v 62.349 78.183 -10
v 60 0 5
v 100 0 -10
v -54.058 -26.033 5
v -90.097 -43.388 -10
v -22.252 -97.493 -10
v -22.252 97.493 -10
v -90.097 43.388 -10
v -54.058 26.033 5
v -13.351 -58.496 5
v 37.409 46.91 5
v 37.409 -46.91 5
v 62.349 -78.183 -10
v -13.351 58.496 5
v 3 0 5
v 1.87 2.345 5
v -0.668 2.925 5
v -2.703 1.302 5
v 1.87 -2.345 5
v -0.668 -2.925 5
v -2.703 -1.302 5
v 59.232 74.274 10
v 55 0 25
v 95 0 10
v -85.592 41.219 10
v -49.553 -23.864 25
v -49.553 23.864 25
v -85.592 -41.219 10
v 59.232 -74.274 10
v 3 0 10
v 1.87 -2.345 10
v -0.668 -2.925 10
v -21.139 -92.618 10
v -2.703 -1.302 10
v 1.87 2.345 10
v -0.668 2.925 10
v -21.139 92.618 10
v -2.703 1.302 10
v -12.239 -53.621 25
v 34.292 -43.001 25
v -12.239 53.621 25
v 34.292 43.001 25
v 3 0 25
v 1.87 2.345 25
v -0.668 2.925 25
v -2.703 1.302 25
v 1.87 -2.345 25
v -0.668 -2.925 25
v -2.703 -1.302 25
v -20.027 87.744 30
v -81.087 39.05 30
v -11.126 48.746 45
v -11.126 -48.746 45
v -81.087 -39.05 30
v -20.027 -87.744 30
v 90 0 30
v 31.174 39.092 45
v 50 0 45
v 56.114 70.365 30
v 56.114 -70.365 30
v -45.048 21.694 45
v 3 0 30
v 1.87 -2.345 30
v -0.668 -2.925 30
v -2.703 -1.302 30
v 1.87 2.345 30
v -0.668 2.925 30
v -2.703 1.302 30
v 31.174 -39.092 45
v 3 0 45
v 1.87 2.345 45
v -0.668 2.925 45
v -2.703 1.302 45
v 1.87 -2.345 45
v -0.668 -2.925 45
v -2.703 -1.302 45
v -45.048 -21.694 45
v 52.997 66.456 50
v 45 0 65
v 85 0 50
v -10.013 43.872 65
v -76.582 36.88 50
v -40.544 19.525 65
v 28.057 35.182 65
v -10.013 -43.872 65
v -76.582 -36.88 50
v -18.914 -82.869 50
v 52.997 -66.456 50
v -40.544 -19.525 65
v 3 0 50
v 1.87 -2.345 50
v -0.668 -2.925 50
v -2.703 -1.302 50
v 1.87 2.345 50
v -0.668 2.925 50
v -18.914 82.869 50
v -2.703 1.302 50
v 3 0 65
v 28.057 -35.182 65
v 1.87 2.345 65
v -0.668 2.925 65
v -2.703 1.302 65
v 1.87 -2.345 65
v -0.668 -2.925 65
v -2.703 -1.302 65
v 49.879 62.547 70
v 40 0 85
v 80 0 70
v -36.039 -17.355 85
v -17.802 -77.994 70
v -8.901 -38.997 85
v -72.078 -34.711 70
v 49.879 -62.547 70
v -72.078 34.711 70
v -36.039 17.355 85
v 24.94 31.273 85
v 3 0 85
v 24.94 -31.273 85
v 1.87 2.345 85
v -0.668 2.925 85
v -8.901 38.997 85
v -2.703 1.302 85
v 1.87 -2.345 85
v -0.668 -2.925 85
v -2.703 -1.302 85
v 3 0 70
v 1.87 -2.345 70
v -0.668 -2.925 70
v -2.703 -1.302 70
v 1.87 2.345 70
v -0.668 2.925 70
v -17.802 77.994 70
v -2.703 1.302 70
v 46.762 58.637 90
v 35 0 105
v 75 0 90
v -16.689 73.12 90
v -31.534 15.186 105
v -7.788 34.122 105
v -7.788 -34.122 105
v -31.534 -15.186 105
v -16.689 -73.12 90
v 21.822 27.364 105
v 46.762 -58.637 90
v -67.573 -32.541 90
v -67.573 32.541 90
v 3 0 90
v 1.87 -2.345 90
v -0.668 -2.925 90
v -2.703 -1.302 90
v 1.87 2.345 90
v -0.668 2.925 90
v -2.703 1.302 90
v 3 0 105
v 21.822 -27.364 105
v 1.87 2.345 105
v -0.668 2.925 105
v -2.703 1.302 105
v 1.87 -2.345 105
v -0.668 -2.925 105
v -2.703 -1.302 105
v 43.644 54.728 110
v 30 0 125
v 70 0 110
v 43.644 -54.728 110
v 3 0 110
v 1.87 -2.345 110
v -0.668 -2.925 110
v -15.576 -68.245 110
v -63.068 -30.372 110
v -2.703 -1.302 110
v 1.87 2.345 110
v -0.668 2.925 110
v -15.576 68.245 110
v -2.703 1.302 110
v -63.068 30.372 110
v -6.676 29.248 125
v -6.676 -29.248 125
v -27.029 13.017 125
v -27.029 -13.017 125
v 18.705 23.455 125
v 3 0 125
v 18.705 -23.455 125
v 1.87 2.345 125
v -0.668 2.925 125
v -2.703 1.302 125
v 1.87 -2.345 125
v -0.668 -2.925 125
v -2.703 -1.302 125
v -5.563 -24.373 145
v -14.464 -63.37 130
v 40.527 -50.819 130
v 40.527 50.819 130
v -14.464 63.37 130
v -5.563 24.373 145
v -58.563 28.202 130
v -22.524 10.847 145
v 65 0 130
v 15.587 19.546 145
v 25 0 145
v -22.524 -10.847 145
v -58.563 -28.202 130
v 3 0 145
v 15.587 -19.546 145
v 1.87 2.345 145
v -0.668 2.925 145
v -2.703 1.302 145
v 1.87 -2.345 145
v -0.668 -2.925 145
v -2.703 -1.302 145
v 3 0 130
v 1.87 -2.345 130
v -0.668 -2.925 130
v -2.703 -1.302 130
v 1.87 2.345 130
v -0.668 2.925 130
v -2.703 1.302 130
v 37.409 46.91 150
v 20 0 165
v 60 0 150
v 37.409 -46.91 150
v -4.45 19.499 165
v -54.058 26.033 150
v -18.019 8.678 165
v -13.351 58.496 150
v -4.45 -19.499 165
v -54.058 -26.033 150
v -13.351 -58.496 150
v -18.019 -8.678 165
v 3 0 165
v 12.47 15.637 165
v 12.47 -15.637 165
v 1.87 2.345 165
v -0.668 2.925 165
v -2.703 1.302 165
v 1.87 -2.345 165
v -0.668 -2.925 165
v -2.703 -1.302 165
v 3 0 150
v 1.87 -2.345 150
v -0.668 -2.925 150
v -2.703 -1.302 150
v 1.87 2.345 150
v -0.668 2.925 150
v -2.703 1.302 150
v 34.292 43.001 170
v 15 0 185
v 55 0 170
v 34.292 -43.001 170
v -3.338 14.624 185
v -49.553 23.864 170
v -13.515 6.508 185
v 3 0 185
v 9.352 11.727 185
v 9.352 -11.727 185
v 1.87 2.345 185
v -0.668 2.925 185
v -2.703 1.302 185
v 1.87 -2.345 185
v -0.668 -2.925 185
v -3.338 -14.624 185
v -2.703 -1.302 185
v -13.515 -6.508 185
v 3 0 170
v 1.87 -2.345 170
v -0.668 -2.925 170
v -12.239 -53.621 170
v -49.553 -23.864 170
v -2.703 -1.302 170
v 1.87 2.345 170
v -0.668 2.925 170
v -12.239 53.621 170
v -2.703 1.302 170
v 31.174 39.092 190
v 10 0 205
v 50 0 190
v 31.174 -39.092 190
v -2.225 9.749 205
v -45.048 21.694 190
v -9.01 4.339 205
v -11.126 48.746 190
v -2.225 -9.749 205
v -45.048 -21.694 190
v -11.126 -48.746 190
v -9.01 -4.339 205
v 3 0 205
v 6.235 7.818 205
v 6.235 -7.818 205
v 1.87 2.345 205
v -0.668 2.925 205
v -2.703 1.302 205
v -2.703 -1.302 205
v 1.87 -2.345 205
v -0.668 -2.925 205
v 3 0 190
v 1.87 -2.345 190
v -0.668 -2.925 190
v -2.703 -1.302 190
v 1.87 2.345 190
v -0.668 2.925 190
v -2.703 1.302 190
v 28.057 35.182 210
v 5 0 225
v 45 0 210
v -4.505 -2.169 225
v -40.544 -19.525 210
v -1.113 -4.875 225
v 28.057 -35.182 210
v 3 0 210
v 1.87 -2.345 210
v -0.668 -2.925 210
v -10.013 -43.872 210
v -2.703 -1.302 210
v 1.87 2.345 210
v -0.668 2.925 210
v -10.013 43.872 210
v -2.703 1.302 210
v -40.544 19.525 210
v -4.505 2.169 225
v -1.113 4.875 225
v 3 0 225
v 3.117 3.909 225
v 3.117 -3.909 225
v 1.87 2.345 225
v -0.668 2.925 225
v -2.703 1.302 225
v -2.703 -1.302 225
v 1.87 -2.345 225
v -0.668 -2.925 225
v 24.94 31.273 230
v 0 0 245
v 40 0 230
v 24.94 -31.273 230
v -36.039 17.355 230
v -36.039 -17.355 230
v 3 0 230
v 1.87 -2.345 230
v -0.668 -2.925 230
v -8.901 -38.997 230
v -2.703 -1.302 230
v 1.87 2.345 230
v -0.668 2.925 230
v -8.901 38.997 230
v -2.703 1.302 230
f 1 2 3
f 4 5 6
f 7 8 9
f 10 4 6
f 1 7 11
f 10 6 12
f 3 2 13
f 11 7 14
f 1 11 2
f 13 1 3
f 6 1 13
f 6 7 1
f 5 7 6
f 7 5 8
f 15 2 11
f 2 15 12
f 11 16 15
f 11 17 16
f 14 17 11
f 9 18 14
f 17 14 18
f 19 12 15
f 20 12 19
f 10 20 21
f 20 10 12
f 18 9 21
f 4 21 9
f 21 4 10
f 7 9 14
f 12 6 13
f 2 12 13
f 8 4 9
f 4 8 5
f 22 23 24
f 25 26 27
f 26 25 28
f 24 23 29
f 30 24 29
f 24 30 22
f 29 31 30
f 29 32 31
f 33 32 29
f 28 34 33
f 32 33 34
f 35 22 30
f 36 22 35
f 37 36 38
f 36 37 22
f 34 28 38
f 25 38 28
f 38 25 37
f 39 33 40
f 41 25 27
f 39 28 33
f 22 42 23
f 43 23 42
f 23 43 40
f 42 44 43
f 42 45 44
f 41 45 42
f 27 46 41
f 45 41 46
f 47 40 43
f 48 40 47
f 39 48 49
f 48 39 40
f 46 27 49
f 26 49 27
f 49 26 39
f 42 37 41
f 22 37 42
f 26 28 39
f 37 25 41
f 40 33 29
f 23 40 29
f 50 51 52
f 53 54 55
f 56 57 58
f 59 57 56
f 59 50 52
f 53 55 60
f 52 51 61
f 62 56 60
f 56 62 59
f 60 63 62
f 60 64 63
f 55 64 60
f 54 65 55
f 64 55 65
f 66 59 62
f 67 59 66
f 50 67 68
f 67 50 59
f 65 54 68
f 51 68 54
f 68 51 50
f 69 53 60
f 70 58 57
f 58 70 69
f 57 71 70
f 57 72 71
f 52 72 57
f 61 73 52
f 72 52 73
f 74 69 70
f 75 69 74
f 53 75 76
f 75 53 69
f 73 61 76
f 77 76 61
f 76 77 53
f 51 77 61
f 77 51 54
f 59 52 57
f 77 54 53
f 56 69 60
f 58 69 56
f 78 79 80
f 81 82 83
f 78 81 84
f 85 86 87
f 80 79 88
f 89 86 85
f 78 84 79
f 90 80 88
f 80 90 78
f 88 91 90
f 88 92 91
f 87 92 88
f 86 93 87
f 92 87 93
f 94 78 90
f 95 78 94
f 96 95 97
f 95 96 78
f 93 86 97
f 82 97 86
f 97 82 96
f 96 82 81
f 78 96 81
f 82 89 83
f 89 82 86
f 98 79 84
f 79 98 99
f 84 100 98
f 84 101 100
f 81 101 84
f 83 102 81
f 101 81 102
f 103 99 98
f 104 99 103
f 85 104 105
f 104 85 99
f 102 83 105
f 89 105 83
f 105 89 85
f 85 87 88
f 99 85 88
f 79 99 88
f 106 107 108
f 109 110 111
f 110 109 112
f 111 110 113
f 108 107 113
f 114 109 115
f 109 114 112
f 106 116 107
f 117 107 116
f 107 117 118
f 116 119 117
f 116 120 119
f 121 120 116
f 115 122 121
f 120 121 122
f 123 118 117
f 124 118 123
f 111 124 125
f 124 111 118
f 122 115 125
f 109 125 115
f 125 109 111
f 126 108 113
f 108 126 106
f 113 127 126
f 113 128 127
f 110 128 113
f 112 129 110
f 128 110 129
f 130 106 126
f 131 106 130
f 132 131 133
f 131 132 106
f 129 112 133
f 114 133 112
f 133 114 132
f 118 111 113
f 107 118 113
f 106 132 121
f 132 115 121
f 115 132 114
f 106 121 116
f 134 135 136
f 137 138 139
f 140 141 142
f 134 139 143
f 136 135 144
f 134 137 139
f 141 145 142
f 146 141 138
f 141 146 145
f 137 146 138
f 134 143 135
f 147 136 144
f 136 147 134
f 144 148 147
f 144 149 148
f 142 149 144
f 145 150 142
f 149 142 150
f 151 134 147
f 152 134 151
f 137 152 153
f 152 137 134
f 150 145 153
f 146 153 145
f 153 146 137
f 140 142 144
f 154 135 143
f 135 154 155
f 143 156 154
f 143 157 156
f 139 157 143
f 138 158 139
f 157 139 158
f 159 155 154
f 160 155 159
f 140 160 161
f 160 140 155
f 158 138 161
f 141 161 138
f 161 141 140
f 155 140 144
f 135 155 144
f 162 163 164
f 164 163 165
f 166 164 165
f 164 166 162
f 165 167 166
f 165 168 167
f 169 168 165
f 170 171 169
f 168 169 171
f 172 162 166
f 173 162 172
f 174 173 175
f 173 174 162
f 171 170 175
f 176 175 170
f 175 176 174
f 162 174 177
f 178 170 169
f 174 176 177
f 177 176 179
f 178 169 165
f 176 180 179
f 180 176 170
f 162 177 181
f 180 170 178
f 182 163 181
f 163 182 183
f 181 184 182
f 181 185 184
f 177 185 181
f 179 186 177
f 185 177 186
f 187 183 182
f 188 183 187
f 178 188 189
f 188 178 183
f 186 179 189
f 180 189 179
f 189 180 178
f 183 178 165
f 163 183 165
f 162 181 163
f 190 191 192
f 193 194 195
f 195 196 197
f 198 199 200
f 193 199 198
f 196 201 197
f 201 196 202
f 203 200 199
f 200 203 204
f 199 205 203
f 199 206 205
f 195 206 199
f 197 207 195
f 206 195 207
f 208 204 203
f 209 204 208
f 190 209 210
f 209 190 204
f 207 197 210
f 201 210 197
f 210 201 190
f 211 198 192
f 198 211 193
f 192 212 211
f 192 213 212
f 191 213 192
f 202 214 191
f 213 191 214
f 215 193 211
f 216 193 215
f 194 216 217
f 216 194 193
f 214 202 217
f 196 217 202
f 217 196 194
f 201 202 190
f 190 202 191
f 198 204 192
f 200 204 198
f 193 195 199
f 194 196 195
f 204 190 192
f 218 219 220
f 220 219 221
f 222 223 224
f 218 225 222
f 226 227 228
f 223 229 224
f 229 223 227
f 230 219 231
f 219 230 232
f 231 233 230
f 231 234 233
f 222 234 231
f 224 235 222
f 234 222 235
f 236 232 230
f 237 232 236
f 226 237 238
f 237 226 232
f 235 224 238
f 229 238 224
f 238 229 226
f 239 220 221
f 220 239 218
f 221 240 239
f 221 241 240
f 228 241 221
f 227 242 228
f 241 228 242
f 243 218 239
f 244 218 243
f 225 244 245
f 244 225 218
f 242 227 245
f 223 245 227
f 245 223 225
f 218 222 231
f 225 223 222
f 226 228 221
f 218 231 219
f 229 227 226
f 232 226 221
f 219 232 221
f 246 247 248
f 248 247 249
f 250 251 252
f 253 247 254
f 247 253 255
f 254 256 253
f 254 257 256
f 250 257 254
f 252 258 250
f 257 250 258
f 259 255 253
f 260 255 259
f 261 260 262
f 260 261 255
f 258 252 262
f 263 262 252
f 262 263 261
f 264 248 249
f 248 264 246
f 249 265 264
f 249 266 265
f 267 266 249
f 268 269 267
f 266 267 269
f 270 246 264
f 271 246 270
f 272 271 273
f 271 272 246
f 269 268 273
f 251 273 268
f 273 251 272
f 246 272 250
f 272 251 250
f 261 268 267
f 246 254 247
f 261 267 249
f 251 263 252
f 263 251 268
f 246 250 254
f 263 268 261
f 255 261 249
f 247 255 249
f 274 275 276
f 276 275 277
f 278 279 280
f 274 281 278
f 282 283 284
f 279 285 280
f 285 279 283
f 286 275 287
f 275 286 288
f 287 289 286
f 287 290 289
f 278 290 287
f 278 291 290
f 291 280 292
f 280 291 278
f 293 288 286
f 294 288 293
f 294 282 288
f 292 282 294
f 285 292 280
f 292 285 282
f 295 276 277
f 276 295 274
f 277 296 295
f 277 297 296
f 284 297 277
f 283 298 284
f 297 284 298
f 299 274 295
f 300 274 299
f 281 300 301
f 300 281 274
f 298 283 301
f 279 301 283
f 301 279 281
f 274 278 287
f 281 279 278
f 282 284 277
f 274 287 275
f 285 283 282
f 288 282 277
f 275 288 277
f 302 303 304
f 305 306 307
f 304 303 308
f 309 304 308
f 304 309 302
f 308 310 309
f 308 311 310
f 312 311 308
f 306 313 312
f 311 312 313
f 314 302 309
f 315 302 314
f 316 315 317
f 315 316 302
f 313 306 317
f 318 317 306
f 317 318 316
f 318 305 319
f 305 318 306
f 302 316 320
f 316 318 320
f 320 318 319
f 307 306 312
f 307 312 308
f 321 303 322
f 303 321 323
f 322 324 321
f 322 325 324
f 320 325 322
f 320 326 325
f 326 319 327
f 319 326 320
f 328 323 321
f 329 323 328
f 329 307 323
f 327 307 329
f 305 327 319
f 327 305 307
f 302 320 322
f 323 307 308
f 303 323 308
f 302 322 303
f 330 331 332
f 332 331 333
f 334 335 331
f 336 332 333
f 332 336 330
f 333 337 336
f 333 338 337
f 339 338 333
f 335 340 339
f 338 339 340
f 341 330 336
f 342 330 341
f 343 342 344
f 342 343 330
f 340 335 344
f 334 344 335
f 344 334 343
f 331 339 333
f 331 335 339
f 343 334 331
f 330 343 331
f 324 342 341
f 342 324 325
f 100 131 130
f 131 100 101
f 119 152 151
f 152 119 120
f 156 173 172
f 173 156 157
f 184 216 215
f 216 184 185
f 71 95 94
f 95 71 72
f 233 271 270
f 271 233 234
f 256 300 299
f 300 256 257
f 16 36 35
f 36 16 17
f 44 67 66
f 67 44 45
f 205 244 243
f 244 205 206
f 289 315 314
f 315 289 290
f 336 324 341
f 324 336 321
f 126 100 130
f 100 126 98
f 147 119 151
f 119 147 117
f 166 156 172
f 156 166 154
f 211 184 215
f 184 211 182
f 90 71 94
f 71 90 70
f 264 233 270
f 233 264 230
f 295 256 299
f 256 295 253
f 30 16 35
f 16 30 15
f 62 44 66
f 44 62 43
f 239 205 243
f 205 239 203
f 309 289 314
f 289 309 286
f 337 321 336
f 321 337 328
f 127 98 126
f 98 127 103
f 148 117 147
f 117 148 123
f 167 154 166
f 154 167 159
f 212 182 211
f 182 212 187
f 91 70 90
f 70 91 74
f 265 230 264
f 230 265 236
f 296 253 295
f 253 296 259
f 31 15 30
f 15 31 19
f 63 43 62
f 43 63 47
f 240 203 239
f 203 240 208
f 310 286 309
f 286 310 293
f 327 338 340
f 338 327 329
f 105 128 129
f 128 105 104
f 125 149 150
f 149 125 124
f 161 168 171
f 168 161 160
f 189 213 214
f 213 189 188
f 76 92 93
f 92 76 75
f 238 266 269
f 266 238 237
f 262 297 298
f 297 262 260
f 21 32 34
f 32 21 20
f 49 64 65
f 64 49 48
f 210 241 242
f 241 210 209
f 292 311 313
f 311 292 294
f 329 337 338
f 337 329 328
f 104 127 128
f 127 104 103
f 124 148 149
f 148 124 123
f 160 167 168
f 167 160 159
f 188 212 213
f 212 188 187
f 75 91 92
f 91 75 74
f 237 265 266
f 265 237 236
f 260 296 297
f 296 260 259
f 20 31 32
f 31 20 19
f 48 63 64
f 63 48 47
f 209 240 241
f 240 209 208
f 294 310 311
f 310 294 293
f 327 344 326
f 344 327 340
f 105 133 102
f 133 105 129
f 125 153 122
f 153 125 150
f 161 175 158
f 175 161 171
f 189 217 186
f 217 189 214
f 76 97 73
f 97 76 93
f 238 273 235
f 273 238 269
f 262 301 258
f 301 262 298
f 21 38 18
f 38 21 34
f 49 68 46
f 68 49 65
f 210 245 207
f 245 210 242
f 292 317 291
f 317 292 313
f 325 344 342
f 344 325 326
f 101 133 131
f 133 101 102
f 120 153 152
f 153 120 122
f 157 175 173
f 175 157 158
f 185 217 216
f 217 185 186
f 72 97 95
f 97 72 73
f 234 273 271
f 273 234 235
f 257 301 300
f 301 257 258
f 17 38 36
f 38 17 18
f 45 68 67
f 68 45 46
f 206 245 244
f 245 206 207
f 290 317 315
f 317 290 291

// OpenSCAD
$fn = 7;
translate([0,0,-10])
cylinder(15,100,60);
translate([0,0,10]) cylinder(15,95,55);
translate([0,0,30]) cylinder(15,90,50);
translate([0,0,50]) cylinder(15,85,45);
translate([0,0,70]) cylinder(15,80,40);
translate([0,0,90]) cylinder(15,75,35);
translate([0,0,110]) cylinder(15,70,30);
translate([0,0,130]) cylinder(15,65,25);
translate([0,0,150]) cylinder(15,60,20);
translate([0,0,170]) cylinder(15,55,15);
translate([0,0,190]) cylinder(15,50,10);
translate([0,0,210]) cylinder(15,45,5);
translate([0,0,230]) cylinder(15,40,0);
cylinder(230,3,3);
